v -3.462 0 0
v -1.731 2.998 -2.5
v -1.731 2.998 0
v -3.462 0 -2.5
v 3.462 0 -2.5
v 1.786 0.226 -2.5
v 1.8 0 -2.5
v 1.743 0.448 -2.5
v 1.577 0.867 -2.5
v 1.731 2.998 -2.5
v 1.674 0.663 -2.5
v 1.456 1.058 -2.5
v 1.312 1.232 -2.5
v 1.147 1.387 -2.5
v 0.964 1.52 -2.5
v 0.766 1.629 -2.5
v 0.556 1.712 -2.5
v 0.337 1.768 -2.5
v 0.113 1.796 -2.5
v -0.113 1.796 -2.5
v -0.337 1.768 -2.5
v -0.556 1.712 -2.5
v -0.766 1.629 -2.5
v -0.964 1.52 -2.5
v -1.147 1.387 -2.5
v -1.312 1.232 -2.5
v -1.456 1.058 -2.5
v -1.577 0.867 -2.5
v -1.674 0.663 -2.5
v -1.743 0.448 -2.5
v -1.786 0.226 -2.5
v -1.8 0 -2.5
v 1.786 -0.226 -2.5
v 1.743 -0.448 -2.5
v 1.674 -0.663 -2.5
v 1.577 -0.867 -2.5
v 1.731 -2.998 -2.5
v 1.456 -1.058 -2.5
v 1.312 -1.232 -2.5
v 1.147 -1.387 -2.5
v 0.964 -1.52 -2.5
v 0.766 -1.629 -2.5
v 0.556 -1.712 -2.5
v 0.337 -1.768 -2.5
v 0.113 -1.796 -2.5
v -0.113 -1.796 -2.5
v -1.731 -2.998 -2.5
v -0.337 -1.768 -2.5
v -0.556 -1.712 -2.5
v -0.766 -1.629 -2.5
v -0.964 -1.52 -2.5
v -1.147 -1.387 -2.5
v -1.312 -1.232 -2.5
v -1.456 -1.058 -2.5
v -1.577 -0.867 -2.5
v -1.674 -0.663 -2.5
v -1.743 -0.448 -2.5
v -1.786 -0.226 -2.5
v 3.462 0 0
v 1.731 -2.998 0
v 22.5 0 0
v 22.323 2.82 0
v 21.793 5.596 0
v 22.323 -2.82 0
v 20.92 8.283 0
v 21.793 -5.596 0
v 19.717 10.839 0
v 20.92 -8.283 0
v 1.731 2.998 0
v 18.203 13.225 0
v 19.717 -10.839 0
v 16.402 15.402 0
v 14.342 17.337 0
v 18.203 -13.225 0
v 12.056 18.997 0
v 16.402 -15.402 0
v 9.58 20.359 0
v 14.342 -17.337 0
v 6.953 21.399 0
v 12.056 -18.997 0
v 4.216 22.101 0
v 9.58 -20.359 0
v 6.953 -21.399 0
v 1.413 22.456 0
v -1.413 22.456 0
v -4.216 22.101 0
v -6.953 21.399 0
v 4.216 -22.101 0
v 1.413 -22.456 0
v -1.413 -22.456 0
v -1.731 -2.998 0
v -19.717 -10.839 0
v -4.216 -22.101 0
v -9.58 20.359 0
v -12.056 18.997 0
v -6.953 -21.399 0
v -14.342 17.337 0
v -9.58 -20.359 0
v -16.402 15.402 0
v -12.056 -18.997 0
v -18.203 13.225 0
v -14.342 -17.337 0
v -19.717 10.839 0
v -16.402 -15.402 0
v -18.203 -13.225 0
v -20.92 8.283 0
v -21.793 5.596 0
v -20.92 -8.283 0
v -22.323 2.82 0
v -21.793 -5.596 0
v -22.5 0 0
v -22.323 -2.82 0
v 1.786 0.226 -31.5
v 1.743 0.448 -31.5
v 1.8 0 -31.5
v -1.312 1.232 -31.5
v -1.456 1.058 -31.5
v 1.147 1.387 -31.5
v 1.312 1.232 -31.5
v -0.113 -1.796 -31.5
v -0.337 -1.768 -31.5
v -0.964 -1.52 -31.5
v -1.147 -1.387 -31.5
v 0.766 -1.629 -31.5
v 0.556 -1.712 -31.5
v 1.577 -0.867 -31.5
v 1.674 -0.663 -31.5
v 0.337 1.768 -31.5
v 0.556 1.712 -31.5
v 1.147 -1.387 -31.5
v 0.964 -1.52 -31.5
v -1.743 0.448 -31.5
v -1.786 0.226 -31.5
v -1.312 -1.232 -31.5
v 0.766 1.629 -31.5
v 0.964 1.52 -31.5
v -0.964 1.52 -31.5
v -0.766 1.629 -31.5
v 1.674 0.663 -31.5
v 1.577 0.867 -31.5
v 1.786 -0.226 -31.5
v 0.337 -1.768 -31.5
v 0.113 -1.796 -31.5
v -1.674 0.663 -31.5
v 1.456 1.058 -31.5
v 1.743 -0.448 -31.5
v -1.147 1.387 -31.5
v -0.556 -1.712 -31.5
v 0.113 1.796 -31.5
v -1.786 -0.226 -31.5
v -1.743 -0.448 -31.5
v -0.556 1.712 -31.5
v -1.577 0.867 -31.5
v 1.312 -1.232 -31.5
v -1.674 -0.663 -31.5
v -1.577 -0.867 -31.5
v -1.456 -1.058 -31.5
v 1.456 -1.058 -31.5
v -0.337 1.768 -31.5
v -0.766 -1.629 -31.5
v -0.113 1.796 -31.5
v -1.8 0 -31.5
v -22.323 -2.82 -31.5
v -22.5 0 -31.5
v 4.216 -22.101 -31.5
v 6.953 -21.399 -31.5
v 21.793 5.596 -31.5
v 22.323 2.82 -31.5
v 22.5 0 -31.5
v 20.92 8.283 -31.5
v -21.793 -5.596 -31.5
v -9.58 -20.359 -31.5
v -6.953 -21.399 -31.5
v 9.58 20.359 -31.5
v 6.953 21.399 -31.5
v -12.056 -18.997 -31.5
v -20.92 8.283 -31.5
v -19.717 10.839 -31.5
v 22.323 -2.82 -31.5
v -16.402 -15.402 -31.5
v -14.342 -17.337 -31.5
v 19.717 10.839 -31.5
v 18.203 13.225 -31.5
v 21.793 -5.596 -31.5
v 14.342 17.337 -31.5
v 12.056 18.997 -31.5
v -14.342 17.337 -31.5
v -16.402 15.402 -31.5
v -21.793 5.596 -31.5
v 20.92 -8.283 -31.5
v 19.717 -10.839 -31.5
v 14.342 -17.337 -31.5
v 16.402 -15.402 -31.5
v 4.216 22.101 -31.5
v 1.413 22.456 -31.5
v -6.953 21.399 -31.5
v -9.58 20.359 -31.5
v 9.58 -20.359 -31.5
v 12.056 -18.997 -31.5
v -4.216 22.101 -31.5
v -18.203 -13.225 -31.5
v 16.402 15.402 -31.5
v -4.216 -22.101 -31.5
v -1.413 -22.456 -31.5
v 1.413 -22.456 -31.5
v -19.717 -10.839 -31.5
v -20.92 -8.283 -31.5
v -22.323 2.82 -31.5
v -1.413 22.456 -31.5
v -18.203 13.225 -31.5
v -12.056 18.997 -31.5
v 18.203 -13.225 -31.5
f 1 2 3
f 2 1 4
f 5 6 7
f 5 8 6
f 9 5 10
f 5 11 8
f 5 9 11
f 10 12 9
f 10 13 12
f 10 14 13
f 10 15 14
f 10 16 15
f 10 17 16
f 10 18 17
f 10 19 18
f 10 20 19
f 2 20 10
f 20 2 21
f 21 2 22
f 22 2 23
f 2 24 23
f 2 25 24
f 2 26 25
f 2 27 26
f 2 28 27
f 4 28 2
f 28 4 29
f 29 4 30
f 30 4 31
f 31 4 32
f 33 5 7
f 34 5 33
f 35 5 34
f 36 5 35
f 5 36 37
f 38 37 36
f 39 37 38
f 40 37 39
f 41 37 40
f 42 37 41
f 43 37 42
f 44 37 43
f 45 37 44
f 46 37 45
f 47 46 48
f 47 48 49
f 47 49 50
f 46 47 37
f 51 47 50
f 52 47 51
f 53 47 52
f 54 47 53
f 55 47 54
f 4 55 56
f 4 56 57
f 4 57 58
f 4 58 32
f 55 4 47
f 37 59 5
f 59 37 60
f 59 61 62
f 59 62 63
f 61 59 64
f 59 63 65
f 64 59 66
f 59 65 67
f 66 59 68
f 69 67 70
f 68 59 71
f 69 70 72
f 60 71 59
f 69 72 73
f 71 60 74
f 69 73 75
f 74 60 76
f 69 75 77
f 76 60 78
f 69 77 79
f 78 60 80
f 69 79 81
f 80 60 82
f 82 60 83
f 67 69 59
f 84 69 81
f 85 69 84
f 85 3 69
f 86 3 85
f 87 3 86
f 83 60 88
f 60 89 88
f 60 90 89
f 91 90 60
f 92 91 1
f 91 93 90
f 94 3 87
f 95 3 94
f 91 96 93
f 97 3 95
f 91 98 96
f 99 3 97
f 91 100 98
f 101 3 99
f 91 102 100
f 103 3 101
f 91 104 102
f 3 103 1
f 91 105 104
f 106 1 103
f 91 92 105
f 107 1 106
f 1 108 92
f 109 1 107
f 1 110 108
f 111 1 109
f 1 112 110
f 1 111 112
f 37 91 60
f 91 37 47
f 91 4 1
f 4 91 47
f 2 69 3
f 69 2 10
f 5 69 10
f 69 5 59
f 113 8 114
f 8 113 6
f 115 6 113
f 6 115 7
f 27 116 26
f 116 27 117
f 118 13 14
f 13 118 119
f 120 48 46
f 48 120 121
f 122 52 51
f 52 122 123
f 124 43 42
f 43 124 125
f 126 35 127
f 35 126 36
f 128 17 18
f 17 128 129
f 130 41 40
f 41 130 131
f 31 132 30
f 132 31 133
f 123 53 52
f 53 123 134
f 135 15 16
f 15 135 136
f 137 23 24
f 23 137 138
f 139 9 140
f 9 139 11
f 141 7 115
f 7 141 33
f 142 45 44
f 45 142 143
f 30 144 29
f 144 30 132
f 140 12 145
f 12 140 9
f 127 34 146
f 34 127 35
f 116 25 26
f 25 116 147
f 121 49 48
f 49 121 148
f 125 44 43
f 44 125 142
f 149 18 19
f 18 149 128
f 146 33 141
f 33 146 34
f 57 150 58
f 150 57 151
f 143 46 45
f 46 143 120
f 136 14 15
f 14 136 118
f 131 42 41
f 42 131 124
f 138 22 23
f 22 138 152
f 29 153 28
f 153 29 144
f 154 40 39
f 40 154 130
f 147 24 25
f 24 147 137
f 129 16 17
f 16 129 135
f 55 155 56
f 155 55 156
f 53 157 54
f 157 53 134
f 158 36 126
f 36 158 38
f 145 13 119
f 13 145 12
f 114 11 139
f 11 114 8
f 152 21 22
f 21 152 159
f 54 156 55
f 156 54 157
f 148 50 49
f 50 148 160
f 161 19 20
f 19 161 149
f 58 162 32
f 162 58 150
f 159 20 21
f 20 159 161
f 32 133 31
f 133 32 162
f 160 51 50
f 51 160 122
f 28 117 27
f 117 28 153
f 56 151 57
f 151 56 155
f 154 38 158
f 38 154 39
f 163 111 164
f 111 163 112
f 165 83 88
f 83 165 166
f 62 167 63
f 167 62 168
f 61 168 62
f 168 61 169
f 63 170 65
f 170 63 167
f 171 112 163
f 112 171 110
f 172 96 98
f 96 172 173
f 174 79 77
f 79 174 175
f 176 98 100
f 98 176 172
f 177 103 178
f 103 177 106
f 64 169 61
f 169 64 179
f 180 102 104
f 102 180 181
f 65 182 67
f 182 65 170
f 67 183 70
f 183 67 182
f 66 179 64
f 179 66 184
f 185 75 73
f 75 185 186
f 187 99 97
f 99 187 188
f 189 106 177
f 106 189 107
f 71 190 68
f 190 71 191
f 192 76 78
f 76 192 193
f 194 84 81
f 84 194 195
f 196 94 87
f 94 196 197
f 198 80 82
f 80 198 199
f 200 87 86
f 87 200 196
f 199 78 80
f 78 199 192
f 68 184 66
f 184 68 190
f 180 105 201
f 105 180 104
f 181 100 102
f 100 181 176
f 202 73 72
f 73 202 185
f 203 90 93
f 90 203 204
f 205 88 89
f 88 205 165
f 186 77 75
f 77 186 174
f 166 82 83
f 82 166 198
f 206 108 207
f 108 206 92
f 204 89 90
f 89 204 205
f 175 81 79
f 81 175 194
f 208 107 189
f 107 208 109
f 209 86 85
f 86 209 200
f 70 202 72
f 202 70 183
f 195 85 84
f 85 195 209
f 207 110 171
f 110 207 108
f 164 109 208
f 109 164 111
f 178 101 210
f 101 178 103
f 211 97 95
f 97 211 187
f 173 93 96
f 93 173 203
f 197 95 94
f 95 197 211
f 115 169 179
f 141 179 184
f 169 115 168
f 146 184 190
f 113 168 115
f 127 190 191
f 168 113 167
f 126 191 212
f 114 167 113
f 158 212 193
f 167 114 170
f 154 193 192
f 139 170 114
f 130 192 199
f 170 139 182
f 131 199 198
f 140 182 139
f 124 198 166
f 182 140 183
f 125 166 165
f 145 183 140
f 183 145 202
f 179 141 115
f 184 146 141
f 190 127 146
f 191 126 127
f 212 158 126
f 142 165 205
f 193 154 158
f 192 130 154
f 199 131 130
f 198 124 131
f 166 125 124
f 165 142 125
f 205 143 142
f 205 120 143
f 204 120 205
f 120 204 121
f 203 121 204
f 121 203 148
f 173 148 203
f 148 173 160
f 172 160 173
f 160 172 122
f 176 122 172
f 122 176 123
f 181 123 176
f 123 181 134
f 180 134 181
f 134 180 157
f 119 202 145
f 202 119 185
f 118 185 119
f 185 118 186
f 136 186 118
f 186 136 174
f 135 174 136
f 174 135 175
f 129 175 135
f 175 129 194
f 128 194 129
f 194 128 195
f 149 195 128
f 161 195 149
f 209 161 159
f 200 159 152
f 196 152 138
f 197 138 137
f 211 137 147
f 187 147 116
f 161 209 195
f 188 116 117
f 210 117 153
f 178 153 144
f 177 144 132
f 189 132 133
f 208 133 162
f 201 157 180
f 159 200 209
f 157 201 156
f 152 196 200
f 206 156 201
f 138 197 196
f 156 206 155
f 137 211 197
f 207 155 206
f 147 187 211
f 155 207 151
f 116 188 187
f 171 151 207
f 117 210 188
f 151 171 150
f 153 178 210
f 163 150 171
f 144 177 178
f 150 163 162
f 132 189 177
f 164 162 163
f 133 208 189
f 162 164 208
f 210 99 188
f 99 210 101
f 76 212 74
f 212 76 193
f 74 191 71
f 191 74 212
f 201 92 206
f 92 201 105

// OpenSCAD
$fn = 50;


difference() {
	union() {
		translate(v = [0, 0, -31.5000000000]) {
			cylinder(h = 31.5000000000, r = 22.5000000000);
		}
	}
	union() {
		translate(v = [0, 0, 0]) {
			rotate(a = [0, 0, 0]) {
				difference() {
					union() {
						translate(v = [0, 0, -2.5000000000]) {
							linear_extrude(height = 2.5000000000) {
								polygon(points = [[3.4620000000, 0.0000000000], [1.7310000000, 2.9981799479], [-1.7310000000, 2.9981799479], [-3.4620000000, 0.0000000000], [-1.7310000000, -2.9981799479], [1.7310000000, -2.9981799479]]);
							}
						}
					}
					union();
				}
			}
		}
		#translate(v = [0, 0, -100.0000000000]) {
			cylinder(h = 200, r = 1.8000000000);
		}
	}
}
